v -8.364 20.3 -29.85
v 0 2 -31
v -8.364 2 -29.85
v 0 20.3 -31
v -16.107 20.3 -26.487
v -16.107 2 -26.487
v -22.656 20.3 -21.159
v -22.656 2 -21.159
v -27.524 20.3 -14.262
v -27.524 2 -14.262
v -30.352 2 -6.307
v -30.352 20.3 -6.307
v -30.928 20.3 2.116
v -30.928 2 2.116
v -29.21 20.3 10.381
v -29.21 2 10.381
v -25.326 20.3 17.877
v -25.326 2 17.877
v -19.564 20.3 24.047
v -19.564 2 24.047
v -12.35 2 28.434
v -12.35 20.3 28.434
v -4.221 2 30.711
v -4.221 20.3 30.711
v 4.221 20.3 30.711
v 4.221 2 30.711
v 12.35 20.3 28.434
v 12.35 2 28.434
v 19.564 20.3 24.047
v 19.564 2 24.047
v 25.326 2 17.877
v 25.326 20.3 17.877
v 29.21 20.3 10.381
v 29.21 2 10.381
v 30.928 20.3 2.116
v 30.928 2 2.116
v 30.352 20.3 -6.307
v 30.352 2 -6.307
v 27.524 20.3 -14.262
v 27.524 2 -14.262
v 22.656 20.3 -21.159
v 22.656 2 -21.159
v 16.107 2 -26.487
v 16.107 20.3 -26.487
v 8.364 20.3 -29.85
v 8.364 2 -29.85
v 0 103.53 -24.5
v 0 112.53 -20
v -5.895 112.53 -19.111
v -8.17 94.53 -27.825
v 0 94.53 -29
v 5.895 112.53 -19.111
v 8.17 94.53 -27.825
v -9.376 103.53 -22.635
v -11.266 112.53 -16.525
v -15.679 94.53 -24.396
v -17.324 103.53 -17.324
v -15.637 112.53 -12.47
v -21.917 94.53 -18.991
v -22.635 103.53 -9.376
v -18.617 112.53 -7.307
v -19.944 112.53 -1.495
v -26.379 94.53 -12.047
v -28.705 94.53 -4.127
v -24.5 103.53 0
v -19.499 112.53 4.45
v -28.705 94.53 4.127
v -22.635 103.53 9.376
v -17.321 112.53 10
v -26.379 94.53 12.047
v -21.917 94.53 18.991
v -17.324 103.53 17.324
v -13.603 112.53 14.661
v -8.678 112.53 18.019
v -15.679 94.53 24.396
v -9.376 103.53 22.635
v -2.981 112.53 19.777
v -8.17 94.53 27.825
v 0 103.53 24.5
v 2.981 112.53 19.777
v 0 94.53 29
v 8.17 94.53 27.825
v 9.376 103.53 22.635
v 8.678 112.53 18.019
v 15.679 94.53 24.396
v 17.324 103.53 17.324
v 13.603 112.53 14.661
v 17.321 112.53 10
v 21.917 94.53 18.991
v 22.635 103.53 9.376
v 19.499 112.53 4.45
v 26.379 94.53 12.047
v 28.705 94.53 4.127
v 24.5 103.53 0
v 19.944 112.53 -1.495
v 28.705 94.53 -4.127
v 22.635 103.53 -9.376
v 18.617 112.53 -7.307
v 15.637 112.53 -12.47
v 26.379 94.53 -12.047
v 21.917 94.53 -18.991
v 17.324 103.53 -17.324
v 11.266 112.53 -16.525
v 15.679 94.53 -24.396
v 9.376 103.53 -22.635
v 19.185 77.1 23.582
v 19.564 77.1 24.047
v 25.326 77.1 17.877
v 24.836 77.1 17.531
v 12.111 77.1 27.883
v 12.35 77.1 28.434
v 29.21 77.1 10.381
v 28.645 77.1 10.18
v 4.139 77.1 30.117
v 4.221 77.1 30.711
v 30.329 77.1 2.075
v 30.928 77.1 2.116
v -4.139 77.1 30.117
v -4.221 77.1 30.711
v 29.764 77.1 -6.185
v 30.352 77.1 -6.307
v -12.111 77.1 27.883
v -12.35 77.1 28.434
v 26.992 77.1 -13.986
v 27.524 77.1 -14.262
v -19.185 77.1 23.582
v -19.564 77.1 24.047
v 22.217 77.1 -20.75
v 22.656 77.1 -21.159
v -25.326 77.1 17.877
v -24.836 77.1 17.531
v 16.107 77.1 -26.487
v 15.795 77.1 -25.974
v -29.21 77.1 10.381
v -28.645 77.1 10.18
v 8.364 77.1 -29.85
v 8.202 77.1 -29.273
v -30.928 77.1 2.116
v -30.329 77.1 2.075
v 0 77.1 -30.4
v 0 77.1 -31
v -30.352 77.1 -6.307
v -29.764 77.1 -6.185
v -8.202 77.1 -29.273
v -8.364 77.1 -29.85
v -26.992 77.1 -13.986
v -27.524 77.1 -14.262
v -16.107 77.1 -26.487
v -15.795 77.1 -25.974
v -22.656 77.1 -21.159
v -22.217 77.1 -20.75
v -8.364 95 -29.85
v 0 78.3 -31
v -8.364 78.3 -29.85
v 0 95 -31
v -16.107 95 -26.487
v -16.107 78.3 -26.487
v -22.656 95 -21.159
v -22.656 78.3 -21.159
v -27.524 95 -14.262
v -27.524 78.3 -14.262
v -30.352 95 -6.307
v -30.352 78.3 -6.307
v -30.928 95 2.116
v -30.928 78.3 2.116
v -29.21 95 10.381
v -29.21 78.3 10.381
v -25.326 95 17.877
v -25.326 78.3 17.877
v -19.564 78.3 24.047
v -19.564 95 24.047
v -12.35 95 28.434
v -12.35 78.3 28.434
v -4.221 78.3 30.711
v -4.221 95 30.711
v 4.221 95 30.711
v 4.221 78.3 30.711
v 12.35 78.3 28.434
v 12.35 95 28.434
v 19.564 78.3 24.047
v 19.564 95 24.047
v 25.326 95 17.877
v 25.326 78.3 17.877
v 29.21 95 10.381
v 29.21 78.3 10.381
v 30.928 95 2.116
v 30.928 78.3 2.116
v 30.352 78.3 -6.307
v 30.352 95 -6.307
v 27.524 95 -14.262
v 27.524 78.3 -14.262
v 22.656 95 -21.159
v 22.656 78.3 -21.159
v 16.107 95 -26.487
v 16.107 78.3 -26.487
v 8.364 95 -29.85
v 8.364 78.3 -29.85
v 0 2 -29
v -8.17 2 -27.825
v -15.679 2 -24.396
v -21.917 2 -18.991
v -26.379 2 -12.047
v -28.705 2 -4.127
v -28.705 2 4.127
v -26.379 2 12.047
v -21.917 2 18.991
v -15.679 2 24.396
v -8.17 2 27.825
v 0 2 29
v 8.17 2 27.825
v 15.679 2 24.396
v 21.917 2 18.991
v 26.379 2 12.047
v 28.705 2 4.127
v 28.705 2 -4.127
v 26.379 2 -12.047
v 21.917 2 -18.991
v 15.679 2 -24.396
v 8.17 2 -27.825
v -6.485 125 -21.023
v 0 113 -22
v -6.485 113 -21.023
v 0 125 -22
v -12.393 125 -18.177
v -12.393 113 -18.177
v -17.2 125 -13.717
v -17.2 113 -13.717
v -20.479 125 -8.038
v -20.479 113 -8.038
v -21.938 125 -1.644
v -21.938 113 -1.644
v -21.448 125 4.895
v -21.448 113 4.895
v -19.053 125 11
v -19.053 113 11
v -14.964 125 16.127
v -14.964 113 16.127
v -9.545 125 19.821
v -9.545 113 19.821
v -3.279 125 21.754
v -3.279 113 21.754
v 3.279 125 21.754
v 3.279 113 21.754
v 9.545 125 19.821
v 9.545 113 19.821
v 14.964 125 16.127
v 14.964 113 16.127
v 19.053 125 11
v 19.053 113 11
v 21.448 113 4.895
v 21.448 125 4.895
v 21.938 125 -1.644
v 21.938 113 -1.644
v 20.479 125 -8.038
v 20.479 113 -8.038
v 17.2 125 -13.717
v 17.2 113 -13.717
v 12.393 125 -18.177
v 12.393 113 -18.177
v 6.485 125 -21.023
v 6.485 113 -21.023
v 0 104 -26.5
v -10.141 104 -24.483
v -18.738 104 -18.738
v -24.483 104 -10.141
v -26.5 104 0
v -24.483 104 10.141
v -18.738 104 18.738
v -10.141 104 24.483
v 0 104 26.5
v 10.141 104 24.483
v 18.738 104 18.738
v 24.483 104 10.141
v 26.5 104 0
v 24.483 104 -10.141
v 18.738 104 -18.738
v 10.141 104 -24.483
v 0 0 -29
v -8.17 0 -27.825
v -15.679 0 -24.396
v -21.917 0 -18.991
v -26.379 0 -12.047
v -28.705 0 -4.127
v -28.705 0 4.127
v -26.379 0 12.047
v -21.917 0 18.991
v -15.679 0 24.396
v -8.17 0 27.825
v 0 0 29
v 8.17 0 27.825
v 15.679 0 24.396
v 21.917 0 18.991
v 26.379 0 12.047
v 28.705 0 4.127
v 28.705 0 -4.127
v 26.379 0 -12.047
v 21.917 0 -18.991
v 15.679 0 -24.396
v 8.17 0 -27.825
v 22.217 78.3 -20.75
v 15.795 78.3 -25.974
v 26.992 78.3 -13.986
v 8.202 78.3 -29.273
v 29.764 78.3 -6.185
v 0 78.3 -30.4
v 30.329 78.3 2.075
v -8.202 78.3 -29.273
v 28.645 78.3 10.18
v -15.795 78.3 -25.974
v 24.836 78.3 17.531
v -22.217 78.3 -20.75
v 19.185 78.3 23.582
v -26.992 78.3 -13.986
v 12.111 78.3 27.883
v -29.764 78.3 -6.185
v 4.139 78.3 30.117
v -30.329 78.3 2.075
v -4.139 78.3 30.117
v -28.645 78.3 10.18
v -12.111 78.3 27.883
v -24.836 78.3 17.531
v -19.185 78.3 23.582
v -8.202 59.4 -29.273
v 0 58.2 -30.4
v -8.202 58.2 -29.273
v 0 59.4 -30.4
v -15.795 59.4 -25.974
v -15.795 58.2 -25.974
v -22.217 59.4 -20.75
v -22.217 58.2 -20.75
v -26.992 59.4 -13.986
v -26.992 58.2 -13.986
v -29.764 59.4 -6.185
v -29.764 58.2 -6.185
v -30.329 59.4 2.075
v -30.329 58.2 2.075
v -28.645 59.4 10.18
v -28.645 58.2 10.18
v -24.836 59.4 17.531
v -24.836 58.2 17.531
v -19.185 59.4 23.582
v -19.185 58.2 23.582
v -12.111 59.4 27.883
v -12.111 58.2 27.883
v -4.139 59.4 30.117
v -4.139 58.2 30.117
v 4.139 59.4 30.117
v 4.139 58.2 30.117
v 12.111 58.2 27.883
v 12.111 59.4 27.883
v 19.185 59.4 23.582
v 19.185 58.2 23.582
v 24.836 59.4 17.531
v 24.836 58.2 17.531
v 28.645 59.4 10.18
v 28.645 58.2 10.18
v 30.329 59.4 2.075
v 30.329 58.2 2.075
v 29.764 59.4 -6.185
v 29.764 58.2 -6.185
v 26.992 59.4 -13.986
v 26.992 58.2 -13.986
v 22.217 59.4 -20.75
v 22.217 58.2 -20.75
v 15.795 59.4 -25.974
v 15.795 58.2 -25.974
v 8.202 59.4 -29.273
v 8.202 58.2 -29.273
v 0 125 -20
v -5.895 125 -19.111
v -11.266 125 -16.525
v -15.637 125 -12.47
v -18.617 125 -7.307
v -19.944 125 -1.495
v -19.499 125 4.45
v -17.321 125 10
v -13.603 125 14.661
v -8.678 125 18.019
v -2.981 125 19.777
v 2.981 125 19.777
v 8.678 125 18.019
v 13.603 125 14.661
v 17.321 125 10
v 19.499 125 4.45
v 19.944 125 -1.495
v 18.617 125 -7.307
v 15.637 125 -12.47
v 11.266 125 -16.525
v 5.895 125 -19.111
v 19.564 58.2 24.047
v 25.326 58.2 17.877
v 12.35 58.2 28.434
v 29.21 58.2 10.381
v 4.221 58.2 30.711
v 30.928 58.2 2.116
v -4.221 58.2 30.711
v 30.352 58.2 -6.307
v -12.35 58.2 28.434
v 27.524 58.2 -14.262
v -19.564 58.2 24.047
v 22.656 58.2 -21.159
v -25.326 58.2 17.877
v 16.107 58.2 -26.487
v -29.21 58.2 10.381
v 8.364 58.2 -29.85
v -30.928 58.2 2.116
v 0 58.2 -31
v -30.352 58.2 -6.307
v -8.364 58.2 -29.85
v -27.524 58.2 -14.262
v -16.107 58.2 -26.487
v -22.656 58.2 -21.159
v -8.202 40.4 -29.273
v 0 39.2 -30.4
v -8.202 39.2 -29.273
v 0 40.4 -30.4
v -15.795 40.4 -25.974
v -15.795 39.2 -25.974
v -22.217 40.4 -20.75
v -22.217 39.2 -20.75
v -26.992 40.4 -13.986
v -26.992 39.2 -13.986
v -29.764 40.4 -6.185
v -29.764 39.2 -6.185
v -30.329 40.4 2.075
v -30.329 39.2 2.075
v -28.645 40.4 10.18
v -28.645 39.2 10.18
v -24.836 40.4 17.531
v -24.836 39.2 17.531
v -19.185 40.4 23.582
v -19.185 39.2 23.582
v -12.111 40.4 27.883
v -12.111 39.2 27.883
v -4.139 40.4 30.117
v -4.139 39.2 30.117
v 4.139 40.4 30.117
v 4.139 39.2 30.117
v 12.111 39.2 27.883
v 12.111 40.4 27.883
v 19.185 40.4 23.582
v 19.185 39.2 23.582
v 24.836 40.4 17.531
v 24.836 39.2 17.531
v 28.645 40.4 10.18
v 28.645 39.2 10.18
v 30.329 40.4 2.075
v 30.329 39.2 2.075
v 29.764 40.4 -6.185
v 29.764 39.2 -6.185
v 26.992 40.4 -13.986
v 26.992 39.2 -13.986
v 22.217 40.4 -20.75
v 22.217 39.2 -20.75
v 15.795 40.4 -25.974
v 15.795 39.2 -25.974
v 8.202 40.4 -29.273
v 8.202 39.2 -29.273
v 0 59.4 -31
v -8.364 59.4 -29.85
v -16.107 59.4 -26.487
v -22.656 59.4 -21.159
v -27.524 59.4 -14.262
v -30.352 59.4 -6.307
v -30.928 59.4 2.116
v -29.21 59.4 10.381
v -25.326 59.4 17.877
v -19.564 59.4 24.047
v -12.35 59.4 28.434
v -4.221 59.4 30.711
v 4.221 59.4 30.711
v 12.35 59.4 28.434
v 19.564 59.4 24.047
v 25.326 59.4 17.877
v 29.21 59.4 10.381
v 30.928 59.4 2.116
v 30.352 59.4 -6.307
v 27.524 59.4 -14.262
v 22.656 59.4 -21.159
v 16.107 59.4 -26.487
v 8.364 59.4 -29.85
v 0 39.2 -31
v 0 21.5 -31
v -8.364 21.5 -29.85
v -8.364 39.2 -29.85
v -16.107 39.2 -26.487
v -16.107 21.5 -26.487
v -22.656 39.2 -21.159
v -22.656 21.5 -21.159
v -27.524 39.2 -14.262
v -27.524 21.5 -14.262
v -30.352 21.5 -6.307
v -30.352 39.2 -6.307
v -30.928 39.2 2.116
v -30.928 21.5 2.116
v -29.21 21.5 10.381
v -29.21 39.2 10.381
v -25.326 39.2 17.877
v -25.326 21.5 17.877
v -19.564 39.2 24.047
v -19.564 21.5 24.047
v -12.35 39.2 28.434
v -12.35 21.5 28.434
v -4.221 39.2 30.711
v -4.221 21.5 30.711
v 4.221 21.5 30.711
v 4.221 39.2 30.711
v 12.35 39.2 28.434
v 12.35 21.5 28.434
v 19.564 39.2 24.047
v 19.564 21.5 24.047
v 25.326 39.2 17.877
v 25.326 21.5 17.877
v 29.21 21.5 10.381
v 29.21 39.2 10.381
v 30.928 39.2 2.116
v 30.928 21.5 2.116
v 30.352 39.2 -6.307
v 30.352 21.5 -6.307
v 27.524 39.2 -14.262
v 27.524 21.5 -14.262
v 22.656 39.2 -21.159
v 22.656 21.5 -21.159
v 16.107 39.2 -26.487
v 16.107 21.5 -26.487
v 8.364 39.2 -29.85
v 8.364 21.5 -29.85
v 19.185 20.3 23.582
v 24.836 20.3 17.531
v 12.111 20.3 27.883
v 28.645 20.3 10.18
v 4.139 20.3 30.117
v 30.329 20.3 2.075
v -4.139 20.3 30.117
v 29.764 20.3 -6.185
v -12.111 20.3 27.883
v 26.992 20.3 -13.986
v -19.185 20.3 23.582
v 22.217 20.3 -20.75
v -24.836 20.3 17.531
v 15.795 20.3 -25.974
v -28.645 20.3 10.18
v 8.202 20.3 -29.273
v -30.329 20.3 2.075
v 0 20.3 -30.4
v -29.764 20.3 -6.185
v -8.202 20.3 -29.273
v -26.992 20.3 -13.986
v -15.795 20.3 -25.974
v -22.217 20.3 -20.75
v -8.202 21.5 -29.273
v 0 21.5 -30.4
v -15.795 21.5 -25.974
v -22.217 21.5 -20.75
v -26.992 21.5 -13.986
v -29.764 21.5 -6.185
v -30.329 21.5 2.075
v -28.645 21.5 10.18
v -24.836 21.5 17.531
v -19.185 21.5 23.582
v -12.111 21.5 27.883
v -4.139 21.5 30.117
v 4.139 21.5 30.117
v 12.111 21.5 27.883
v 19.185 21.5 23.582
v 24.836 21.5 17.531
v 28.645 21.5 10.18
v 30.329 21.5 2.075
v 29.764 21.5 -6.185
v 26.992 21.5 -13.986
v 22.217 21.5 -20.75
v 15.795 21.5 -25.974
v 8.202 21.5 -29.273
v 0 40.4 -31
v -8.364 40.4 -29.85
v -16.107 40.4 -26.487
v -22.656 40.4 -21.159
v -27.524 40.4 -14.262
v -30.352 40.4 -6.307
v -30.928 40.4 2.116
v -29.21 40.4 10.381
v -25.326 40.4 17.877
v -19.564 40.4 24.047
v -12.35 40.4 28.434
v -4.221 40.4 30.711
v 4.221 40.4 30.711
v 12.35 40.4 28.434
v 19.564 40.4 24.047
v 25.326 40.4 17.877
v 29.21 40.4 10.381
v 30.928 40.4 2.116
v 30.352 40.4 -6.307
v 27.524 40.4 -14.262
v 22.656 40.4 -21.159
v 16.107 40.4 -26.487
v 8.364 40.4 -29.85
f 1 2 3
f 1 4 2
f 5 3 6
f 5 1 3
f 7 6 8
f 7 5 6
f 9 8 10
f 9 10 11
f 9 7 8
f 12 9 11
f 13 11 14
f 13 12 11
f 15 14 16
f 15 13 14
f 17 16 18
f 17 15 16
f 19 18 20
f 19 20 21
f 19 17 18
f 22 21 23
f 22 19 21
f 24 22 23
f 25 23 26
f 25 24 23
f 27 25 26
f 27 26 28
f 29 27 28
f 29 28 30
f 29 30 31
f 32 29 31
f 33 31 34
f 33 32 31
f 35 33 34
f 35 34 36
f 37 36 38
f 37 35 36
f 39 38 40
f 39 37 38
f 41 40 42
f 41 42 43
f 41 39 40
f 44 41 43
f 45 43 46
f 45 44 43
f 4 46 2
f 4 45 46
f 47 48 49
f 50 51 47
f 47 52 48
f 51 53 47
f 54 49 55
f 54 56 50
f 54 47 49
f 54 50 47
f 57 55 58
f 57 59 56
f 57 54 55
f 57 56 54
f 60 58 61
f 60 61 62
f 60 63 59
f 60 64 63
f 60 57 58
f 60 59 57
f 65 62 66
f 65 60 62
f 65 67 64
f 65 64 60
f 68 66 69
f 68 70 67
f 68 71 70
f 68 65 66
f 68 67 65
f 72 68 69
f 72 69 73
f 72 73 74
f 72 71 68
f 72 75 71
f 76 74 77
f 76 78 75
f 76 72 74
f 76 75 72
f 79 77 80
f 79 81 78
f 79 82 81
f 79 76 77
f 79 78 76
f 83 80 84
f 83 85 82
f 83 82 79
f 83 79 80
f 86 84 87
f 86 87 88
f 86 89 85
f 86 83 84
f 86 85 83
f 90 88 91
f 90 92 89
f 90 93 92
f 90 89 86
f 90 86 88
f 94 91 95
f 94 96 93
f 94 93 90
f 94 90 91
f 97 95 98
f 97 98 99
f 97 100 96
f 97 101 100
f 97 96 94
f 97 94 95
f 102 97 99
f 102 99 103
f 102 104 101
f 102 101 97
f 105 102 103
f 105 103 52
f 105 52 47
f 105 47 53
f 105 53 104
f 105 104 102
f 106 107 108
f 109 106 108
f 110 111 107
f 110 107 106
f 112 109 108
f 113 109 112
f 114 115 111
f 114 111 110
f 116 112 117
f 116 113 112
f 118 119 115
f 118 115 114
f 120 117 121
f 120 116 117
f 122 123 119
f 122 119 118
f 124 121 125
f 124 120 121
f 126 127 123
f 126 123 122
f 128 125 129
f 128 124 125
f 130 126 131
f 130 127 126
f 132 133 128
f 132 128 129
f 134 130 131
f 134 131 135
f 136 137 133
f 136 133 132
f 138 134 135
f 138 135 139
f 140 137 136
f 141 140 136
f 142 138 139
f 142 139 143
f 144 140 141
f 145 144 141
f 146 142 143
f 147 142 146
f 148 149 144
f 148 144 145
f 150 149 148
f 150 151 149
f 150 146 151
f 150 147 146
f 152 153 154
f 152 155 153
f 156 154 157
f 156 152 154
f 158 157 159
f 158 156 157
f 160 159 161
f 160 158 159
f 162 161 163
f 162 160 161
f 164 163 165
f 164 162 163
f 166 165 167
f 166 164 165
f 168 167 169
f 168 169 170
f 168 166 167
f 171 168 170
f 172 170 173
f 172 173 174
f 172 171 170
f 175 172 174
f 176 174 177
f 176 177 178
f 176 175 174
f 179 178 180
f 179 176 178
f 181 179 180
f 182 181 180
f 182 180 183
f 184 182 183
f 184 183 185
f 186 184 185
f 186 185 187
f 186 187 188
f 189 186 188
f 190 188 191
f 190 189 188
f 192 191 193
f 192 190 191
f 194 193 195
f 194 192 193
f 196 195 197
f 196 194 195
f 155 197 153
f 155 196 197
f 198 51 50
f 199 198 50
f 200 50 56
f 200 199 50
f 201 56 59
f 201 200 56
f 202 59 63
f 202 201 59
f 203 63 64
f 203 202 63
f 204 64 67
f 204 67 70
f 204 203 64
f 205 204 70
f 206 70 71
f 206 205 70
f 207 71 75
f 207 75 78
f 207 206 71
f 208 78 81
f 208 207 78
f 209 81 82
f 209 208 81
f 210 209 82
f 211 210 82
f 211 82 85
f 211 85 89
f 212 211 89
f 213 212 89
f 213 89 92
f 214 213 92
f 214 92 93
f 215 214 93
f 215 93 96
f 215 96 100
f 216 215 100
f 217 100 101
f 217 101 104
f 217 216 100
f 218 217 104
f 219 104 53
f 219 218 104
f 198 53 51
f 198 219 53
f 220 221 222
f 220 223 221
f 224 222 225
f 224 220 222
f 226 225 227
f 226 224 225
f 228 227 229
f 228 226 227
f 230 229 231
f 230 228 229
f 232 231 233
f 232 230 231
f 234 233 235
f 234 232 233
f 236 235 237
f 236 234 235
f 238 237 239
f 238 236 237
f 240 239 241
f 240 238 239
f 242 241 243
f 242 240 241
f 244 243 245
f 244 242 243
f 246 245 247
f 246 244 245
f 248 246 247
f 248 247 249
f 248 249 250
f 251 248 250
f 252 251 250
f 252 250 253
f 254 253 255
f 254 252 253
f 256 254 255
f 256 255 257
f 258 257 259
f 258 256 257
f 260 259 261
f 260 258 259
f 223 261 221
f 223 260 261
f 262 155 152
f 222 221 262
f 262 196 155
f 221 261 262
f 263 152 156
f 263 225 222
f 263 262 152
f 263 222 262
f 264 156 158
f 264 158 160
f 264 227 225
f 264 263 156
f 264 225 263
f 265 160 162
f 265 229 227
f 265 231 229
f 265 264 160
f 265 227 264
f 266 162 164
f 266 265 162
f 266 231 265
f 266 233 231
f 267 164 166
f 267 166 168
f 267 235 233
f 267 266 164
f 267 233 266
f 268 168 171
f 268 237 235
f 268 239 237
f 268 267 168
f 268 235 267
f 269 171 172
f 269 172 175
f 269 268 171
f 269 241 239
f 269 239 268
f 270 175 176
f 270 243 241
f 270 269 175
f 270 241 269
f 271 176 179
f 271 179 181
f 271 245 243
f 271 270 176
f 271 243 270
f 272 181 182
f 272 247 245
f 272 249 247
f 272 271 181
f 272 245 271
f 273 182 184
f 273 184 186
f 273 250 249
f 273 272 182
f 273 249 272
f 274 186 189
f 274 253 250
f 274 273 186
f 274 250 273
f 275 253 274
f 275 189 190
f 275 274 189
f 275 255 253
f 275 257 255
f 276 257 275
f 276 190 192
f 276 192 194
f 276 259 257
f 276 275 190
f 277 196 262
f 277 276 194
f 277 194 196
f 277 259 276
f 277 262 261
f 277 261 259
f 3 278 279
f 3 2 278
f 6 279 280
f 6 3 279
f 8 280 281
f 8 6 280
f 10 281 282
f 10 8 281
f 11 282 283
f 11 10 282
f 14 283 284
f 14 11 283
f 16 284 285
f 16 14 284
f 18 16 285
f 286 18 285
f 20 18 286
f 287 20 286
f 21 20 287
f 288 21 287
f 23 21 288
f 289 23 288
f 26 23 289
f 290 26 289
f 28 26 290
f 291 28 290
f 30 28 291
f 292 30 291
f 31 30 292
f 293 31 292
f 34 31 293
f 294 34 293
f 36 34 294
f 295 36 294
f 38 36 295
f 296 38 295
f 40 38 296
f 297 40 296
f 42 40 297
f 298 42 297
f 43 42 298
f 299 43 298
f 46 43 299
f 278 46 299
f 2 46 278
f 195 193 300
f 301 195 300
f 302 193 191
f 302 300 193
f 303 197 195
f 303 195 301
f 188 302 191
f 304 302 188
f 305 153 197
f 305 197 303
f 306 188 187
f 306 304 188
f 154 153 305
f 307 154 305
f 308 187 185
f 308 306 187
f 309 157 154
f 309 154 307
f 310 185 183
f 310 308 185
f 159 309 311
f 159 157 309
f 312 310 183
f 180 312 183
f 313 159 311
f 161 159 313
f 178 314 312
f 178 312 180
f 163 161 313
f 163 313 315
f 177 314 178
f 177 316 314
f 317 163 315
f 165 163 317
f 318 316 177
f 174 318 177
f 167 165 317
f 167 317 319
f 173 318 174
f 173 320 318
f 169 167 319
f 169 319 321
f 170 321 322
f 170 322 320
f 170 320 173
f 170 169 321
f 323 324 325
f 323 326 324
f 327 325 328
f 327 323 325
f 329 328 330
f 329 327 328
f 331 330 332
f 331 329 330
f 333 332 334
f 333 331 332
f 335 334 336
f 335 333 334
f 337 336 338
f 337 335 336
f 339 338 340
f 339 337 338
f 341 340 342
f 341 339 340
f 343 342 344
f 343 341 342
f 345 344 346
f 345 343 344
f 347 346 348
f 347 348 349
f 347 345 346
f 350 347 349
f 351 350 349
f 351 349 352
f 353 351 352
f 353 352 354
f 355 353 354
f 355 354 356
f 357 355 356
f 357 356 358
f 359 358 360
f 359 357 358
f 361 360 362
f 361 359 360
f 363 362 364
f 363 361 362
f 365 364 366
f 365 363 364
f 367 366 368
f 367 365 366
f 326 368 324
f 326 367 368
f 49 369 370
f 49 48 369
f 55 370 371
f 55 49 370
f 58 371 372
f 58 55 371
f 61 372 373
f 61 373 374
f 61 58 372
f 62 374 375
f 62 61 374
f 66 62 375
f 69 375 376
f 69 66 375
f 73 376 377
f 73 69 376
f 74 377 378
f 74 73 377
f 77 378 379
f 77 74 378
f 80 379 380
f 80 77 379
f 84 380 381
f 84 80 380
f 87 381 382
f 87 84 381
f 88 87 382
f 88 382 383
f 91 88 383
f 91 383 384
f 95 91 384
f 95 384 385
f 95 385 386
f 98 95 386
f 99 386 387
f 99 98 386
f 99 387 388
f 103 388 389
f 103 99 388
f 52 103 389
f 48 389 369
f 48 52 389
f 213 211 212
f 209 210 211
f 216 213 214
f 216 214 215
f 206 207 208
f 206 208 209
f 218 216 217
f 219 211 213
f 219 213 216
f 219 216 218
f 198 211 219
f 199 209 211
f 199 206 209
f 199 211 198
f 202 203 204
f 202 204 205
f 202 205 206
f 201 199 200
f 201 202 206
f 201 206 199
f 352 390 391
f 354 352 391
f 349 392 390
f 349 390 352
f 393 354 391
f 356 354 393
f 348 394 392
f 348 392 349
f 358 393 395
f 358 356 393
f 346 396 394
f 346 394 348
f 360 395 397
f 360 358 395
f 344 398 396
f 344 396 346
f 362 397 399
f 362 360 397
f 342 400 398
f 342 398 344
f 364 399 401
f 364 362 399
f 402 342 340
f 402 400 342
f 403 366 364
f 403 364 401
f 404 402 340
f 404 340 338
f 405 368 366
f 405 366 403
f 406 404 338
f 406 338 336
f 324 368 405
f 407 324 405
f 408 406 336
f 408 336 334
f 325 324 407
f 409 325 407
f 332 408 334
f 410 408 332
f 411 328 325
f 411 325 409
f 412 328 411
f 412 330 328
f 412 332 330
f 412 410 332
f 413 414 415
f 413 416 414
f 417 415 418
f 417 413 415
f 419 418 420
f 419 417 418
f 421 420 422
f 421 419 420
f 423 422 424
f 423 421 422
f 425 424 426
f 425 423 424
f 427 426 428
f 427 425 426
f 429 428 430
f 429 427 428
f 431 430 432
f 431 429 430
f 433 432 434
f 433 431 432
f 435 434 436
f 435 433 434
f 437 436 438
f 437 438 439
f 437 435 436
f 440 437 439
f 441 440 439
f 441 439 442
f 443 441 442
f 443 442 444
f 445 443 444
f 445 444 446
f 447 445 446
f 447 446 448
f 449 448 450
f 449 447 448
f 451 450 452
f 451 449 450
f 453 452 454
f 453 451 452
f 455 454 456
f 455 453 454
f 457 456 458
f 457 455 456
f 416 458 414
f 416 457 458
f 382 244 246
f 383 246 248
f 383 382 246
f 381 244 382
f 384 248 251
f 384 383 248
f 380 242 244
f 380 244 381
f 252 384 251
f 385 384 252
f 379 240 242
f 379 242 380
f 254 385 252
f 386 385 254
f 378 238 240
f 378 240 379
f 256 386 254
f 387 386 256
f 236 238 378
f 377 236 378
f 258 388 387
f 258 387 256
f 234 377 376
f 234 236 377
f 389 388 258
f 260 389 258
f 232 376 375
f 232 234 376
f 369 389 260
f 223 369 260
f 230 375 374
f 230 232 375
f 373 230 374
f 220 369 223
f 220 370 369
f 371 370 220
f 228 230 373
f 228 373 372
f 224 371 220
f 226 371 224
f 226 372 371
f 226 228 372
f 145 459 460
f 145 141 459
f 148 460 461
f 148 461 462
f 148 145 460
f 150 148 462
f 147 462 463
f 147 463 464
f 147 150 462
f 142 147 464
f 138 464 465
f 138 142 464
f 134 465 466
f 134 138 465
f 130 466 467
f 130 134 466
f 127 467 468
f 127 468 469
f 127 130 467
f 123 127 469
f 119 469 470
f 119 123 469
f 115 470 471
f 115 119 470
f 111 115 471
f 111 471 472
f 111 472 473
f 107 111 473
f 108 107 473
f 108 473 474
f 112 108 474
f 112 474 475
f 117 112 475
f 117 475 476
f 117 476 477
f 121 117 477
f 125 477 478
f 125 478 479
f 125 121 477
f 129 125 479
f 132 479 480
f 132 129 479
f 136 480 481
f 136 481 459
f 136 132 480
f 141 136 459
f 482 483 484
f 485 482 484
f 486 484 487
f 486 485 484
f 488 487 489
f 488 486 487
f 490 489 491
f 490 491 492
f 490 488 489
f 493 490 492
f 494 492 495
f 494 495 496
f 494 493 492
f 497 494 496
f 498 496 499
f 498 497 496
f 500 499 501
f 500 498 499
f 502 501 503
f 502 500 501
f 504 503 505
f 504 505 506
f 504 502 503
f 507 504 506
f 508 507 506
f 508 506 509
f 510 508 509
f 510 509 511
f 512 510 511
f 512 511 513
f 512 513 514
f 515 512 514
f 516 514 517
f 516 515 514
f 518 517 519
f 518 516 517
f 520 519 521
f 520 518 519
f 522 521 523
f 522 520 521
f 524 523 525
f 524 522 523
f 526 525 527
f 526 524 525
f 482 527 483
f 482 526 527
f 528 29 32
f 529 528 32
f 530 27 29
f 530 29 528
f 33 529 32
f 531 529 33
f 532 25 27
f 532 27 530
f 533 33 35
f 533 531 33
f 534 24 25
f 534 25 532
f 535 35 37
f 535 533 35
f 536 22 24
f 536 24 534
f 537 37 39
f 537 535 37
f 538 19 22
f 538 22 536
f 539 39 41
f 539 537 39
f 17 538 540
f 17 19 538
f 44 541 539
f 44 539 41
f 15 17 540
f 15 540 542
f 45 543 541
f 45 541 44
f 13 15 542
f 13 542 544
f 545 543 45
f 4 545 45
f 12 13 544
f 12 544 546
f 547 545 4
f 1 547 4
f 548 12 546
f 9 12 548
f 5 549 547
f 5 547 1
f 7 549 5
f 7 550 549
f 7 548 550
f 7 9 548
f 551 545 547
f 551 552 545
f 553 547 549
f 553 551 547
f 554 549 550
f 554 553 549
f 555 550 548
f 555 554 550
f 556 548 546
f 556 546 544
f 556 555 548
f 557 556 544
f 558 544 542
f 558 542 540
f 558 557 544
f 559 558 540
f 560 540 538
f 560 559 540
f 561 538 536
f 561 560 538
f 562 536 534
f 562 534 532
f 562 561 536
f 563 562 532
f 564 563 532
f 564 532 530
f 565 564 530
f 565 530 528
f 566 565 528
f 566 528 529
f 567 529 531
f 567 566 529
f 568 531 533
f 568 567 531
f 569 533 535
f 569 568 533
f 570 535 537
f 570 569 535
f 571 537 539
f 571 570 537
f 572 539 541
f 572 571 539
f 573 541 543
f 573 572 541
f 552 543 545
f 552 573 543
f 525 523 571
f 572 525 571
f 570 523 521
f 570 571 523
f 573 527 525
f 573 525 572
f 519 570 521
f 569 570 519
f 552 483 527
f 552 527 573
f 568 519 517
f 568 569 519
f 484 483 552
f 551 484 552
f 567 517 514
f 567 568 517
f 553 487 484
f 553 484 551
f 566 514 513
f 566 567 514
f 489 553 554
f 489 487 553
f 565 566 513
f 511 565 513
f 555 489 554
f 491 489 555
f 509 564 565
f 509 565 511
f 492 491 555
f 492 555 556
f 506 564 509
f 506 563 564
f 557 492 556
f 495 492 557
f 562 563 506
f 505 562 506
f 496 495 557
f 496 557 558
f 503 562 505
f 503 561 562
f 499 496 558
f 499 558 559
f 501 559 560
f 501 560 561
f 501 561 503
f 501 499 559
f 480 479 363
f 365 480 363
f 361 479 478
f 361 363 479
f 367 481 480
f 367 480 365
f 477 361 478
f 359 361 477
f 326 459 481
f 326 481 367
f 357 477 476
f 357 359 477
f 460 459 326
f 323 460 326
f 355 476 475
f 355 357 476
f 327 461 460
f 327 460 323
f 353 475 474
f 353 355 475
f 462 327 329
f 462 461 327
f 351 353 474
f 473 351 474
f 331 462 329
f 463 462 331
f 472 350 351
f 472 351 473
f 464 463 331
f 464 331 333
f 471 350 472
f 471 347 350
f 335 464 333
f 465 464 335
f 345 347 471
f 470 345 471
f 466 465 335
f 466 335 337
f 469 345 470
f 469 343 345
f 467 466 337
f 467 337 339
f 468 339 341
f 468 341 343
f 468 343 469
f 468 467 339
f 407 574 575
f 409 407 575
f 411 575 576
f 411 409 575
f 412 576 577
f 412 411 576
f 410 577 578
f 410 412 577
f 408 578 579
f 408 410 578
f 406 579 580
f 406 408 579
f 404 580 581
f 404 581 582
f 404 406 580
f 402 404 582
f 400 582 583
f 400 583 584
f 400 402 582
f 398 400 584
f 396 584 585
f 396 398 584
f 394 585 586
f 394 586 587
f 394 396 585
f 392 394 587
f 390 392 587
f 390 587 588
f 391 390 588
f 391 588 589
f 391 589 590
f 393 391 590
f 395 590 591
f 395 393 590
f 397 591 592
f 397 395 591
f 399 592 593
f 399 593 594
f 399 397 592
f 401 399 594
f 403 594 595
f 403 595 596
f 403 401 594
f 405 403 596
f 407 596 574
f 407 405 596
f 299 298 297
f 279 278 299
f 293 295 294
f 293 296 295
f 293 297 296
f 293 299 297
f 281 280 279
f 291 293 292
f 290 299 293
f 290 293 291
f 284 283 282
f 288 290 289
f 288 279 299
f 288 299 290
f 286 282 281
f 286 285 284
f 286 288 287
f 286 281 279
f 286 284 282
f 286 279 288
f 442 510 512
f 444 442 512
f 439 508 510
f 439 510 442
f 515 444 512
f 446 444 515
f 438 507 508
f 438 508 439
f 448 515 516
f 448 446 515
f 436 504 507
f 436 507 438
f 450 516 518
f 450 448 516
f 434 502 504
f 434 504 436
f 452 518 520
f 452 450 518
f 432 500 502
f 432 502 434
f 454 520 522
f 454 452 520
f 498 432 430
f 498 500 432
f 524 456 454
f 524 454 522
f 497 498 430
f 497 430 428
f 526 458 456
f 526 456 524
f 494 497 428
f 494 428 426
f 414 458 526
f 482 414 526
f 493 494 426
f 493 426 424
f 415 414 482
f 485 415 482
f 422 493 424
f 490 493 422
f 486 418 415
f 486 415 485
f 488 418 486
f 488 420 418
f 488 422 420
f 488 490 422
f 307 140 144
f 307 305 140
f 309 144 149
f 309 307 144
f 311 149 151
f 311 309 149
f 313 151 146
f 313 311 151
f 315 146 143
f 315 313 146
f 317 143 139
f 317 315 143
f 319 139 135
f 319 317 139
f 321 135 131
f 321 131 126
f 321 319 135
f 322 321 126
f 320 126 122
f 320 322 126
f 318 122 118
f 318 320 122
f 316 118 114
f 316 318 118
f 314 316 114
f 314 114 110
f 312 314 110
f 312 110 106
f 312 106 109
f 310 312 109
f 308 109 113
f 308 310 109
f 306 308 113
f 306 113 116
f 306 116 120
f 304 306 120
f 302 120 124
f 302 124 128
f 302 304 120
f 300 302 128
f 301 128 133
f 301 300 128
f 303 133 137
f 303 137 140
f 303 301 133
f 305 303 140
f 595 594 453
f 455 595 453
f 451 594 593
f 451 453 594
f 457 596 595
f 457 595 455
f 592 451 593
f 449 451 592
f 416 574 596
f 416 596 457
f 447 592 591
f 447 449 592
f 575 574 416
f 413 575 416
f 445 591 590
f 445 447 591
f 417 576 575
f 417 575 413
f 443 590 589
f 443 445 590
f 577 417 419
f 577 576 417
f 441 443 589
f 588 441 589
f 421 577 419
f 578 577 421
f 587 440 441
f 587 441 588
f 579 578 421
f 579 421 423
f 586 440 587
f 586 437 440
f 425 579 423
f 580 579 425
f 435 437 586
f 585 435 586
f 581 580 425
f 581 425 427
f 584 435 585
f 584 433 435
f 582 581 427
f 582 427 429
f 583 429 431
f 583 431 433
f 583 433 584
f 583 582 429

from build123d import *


with BuildPart() as part:
    # Sketch1 → Bottle_body_revolve (revolve)
    with BuildSketch(Plane.XY, mode=Mode.PRIVATE) as bottle_body_revolve_sk:
        Polygon((0, 0), (29, 0), (31, 2), (31, 20.3), (30.4, 20.3), (30.4, 21.5), (31, 21.5), (31, 39.2), (30.4, 39.2), (30.4, 40.4), (31, 40.4), (31, 58.2), (30.4, 58.2), (30.4, 59.4), (31, 59.4), (31, 77.1), (30.4, 77.1), (30.4, 78.3), (31, 78.3), (31, 95), (22, 113), (22, 125), (20, 125), (20, 112.53), (29, 94.53), (29, 2), (0, 2), align=None)
    revolve(bottle_body_revolve_sk.sketch.rotate(Axis((0, -10, 0), (0, 1, 0)), 90), axis=Axis((0, -10, 0), (0, 1, 0)))


solid = part.part
